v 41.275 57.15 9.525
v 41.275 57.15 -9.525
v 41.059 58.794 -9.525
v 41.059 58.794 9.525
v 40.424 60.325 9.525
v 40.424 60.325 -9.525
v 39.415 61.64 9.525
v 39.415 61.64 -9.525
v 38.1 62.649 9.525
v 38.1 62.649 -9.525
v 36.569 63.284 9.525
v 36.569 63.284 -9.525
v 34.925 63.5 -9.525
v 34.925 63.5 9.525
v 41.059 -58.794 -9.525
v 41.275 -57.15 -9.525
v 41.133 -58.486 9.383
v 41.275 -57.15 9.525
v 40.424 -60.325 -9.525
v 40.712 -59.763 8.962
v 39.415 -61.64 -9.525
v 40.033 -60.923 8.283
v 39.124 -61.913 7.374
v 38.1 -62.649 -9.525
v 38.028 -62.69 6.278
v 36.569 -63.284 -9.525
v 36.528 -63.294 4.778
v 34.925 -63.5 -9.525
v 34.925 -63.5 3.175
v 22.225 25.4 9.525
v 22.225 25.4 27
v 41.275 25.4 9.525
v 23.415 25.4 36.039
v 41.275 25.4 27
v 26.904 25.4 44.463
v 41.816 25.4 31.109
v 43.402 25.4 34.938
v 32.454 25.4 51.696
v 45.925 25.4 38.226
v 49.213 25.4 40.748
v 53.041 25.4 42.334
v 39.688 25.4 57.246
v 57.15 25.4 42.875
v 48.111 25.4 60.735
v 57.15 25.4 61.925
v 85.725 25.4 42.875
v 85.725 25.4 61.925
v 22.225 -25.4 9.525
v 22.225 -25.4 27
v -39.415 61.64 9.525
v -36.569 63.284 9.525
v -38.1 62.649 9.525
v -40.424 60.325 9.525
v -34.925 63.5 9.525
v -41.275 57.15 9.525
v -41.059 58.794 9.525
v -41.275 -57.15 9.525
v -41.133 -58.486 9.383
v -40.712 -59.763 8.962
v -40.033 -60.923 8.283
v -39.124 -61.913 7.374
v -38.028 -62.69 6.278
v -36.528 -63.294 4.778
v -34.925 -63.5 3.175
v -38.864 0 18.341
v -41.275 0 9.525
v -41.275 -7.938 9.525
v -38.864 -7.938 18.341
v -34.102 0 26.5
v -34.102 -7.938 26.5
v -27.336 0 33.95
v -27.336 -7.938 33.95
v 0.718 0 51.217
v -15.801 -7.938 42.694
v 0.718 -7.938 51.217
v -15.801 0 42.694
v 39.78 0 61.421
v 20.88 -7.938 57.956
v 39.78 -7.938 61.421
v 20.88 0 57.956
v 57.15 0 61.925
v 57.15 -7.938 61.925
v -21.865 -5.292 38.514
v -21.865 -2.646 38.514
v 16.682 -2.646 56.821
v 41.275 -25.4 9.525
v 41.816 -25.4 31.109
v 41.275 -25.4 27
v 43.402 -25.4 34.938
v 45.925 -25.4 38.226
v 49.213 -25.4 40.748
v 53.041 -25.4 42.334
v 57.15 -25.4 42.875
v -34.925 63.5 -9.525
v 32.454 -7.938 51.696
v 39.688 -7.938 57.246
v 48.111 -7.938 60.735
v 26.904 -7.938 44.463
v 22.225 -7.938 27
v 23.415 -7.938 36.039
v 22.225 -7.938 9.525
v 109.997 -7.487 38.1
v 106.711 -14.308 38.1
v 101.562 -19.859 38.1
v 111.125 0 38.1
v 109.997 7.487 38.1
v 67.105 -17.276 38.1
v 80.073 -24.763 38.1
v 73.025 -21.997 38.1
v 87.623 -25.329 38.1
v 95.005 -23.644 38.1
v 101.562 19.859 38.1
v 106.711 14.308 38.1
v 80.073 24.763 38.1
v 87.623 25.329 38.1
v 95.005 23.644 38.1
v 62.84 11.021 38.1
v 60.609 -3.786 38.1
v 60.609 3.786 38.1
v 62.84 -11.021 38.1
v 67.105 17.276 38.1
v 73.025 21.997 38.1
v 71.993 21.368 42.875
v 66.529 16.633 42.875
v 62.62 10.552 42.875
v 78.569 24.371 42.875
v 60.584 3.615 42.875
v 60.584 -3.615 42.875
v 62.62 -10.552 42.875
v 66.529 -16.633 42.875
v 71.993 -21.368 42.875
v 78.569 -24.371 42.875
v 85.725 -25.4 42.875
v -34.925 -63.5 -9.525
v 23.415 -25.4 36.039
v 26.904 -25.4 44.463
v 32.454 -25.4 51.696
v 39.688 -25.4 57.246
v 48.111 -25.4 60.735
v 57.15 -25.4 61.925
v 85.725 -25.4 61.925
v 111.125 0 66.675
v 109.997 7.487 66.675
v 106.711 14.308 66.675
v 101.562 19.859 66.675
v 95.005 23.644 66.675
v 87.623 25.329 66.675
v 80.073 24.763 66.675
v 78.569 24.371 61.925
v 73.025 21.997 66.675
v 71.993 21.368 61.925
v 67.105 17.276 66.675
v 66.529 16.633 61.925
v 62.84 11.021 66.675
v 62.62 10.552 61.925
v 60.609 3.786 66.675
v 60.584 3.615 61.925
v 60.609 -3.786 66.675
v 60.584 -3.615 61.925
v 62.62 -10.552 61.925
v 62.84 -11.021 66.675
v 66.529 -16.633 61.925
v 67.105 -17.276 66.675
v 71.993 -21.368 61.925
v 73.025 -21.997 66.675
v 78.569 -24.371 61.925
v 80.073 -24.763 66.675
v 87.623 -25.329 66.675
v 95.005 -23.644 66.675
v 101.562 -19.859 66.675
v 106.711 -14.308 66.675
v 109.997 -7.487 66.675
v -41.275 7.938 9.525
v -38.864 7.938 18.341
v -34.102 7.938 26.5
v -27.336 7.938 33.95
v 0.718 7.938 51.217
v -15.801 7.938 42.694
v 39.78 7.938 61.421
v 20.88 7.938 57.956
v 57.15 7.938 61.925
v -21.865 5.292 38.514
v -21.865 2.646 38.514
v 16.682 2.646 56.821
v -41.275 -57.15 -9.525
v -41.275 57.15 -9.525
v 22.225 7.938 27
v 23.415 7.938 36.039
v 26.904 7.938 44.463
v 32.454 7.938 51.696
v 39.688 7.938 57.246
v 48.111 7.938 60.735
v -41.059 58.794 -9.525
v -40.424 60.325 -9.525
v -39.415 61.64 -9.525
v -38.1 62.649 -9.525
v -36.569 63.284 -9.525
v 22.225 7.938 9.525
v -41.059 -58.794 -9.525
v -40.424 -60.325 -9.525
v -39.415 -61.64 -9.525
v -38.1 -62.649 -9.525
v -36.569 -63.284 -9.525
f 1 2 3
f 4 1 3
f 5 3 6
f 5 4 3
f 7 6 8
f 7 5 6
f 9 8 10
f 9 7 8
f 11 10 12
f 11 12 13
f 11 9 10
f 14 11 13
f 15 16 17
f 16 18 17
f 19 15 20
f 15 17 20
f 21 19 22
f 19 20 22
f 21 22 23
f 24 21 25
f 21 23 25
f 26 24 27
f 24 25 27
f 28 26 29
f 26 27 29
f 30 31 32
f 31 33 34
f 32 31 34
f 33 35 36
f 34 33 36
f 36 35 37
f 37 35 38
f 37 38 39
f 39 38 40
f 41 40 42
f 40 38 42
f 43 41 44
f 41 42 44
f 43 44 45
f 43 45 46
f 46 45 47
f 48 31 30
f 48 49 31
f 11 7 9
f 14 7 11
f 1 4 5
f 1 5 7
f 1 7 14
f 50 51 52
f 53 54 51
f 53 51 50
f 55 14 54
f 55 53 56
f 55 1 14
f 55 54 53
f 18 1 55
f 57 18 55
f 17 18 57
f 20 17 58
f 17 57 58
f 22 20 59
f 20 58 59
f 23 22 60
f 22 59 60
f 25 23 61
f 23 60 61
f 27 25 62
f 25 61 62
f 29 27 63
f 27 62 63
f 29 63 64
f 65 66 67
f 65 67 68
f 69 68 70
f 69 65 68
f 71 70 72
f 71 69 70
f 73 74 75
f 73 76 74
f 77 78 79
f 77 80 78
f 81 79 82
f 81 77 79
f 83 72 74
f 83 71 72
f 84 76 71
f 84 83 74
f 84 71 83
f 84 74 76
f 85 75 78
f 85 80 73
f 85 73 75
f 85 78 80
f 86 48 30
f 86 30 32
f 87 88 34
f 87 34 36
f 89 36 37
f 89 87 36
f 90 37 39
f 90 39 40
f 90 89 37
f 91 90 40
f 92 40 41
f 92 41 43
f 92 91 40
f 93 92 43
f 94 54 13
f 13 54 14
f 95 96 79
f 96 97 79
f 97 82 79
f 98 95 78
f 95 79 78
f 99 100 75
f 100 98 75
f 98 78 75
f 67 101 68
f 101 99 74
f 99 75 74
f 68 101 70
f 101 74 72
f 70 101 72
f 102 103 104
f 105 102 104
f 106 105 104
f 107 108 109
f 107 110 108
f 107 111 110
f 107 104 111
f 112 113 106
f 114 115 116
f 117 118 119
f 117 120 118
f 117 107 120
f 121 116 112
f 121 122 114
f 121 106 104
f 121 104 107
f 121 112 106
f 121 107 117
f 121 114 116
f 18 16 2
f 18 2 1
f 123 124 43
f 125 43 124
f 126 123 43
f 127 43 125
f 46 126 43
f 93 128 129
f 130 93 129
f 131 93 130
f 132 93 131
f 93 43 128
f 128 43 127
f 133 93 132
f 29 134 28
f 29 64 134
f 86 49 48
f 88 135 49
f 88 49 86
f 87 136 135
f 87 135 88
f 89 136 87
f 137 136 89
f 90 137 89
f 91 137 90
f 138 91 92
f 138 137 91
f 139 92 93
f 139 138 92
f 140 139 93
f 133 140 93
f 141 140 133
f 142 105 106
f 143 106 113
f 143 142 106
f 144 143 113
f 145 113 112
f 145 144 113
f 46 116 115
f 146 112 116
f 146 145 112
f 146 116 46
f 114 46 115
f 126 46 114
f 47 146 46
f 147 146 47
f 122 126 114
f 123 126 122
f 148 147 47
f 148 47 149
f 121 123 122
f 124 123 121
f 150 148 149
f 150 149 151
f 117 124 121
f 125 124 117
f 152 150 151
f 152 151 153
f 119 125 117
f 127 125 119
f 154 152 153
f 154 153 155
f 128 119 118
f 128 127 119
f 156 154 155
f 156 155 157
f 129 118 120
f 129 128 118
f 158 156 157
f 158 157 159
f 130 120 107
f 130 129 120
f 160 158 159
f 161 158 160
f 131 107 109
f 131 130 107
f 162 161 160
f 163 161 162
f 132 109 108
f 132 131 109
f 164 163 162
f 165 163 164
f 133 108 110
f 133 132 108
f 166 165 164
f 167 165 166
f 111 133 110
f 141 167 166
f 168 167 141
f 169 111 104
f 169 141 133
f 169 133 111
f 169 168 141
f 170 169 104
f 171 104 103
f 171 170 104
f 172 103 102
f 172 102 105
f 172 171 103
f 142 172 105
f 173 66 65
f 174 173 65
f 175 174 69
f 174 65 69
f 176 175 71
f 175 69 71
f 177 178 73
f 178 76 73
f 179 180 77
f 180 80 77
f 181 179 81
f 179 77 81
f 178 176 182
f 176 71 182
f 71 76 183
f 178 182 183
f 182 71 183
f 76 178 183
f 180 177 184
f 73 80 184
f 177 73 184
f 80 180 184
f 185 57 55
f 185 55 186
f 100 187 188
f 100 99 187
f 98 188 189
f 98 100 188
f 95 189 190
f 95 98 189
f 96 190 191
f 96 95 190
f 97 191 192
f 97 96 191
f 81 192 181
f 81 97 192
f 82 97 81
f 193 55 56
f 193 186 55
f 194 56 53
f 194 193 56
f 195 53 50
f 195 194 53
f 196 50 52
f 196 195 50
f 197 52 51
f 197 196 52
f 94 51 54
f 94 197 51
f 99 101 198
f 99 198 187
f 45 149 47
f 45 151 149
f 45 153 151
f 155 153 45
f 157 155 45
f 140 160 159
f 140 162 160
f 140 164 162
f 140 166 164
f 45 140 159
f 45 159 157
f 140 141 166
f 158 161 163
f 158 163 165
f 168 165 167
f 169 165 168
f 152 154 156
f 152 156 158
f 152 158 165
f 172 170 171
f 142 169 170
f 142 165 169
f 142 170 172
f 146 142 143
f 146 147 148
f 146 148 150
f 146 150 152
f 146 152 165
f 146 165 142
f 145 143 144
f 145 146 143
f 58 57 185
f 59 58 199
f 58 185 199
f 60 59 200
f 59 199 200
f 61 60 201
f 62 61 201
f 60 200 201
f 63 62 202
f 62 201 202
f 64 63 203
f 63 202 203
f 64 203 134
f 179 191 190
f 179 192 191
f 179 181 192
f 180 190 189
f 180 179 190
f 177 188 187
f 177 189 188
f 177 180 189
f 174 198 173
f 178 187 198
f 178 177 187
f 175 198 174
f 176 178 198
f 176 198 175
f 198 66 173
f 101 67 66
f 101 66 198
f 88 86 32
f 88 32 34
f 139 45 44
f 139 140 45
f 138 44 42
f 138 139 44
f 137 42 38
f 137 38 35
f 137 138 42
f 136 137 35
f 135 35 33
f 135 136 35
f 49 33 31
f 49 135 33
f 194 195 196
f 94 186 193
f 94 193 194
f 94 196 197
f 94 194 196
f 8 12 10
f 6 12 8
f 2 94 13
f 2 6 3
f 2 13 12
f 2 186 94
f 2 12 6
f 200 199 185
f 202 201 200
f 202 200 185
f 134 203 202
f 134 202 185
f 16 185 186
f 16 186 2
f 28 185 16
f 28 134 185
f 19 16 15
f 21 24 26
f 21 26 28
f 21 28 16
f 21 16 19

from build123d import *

# Parameters (mm, degrees)
F1_DEPTH = 63.5
F0_W     = 25.4
F0_H     = 19.05
F2_DEPTH = 25.4
F3_DEPTH = 7.9375
F5_R     = 6.35


with BuildPart() as f1:
    # F0 (on Front) → F1 (new body, symmetric)
    with BuildSketch(Plane.XZ):
        Polygon((22.225, 9.525), (-41.275, 9.525), (-41.275, -9.525), (41.275, -9.525), (41.275, 9.525), align=None)
    extrude(amount=F1_DEPTH, both=True)

    # F5
    f5_edges = [f1.edges().sort_by_distance(p)[0] for p in [
        (-41.275, -63.5, 0),
        (41.275, -63.5, 0),
        (41.275, 63.5, 0),
        (-41.275, 63.5, 0),
        (0, -63.5, 9.525),
    ]]
    fillet(f5_edges, radius=F5_R)


with BuildPart() as f2:
    # F0 (on Front) → F2 (new body, symmetric)
    with BuildSketch(Plane.XZ):
        with BuildLine():
            Line((22.225, 27.0002), (22.225, 9.525))
            Line((22.225, 9.525), (41.275, 9.525))
            Line((41.275, 9.525), (41.275, 27.0002))
            ThreePointArc((41.275, 27.0002), (45.9246798487, 38.2255201513), (57.15, 42.8752))
            Line((57.15, 42.8752), (60.325, 42.8752))
            Line((60.325, 42.8752), (60.325, 61.9252))
            Line((60.325, 61.9252), (57.15, 61.9252))
            ThreePointArc((57.15, 61.9252), (32.4542956671, 51.6959043329), (22.225, 27.0002))
        make_face()
        with Locations((73.025, 52.4002)):
            Rectangle(F0_W, F0_H)
    extrude(amount=F2_DEPTH, both=True)

    # F0 (on Front) → F4 (revolve)
    with BuildSketch(Plane.XZ):
        Polygon((85.725, 66.675), (85.725, 61.9252), (85.725, 42.8752), (85.725, 38.1), (111.125, 38.1), (111.125, 66.675), align=None)
    revolve(axis=Axis((85.725, 0, 52.3875), (0, 0, 1)))


with BuildPart() as f3:
    # F0 (on Front) → F3 (new body, symmetric)
    with BuildSketch(Plane.XZ):
        with BuildLine():
            add(Edge.make_bspline(
                [(-41.275, 9.525), (-37.1716171503, 43.0133752525), (21.4597117156, 64.264036715), (57.15, 61.9252)],
                knots=[0, 0, 0, 0, 111.5045361635, 111.5045361635, 111.5045361635, 111.5045361635], degree=3))
            Line((-41.275, 9.525), (22.225, 9.525))
            Line((22.225, 9.525), (22.225, 27.0002))
            ThreePointArc((22.225, 27.0002), (32.4542956671, 51.6959043329), (57.15, 61.9252))
        make_face()
    extrude(amount=F3_DEPTH, both=True)


solid = Compound([f1.part, f2.part, f3.part])
